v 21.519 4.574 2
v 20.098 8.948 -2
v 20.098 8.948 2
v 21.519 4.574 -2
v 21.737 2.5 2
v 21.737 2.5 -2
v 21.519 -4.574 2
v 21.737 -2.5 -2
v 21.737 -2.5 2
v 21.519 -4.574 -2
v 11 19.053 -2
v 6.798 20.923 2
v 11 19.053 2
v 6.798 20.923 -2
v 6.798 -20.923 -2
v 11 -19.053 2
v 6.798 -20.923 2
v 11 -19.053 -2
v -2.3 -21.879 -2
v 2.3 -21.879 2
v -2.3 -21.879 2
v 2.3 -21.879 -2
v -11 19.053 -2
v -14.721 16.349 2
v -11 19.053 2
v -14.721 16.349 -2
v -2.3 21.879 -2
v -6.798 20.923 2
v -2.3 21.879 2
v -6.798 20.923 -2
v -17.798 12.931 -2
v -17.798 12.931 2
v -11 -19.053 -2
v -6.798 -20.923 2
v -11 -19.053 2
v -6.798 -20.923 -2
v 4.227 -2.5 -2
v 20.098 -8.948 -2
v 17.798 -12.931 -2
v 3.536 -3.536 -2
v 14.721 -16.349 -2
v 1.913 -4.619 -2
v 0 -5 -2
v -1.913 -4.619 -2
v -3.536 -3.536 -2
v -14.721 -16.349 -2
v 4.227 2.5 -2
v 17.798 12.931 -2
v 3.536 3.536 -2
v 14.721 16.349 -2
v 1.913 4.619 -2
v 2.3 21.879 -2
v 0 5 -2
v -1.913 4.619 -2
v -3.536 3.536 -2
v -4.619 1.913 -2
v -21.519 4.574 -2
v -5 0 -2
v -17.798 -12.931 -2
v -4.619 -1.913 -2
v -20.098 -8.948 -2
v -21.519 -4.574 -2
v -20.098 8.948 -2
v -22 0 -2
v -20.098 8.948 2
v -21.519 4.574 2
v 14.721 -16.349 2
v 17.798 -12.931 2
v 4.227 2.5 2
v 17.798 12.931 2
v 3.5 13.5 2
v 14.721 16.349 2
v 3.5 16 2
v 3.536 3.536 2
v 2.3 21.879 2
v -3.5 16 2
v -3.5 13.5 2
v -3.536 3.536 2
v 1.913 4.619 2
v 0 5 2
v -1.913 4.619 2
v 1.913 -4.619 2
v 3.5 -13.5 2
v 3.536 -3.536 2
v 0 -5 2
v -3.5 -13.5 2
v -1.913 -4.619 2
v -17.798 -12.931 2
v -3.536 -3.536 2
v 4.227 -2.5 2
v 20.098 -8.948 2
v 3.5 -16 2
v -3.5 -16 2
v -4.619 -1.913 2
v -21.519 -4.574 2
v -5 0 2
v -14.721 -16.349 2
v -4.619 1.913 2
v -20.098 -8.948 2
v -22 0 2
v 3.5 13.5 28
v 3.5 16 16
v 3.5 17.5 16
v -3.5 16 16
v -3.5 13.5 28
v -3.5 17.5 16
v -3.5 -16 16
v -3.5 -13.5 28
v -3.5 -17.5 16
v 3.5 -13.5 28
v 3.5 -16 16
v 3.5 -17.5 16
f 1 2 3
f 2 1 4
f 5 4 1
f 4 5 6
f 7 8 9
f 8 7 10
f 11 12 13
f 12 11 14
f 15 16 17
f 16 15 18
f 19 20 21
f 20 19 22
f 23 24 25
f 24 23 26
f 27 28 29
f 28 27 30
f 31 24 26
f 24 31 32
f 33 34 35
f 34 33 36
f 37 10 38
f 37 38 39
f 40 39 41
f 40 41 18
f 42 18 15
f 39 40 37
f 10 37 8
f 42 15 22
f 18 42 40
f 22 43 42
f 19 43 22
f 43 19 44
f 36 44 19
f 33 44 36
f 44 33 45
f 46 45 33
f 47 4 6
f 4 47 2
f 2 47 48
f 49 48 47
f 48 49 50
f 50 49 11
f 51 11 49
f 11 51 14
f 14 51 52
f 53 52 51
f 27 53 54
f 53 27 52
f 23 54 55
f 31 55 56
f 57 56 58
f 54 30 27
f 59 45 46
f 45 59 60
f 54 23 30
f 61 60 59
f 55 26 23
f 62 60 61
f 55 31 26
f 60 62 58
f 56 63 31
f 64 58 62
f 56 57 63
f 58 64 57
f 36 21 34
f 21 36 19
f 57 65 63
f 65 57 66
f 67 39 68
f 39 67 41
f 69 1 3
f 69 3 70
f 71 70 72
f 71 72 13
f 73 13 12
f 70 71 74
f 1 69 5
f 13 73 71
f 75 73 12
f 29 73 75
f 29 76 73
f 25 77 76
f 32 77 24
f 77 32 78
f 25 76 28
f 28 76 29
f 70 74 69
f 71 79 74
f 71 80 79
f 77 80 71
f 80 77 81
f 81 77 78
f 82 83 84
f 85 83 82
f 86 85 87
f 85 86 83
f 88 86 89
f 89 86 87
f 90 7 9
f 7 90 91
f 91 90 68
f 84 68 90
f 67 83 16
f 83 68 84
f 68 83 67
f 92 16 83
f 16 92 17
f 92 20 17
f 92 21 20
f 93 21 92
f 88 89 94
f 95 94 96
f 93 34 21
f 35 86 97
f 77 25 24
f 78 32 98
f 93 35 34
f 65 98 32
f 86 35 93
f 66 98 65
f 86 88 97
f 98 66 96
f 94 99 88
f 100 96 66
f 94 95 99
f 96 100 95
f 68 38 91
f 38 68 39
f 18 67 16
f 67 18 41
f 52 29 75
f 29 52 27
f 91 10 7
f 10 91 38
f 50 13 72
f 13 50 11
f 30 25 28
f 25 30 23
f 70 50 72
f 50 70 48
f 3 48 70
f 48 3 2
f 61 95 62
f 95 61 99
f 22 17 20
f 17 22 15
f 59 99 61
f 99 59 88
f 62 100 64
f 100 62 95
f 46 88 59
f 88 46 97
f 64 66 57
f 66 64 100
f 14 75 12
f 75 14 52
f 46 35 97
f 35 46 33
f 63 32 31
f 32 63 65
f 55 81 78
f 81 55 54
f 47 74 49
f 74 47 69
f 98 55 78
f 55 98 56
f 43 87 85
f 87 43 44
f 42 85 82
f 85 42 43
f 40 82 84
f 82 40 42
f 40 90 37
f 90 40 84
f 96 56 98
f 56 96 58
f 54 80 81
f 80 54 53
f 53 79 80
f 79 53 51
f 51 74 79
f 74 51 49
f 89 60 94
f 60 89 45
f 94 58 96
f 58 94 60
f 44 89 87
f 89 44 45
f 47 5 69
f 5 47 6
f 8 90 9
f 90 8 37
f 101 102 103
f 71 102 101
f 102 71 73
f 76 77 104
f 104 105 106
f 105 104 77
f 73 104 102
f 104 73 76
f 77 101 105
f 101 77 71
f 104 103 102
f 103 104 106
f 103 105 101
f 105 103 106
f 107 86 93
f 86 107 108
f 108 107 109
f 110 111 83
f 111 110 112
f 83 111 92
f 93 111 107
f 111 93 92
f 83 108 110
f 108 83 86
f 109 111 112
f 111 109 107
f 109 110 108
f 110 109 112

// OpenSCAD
BASE_RAD = 16;
BASE_HEIGHT = 4;
CABLE_WIDTH = 5;
HOLE_RAD = 5;
CLIP_WIDTH = 7;
CLIP_HEIGHT = 20;
CLIP_DEPTH = 2.5;
SNAP_CLEARANCE = 6;
SNAP_OFFSET = CLIP_HEIGHT - SNAP_CLEARANCE;
SNAP_SIZE = 2;
SNAP_HEIGHT = 12;

//Draw a prism based on a
//right angled triangle
//l - length of prism
//w - width of triangle
//h - height of triangle
module prism(l, w, h) {
	translate([0, l, 0]) rotate( a= [90, 0, 0])
	linear_extrude(height = l) polygon(points = [
		[0, 0],
		[w, 0],
		[0, h]
	], paths=[[0,1,2,0]]);
}

module base() {
	lip = 6;
	difference() {
		cylinder(h=BASE_HEIGHT,r=BASE_RAD+lip, center=true);
		cylinder(h=BASE_HEIGHT+1, r=HOLE_RAD, center=true);
		translate([0, -CABLE_WIDTH/2, -(BASE_HEIGHT+1)/2])
		cube([BASE_RAD + lip + 1, CABLE_WIDTH, BASE_HEIGHT+1, ]);
	}
}

module clip() {

		rotate([0,0,180]) {
		cube([CLIP_WIDTH, CLIP_DEPTH, CLIP_HEIGHT]);
		translate([CLIP_WIDTH,0, 18])
		rotate([0,0,90])
		prism(CLIP_WIDTH, 4, SNAP_HEIGHT);
}
}

module main() {
	base();

	rotate([0,0,180]) 
	translate([CLIP_WIDTH/2, -(BASE_RAD - CLIP_DEPTH), -BASE_HEIGHT/2]) 
		clip(-1);
	
	

	rotate([0,0,0]) {
		translate([(CLIP_WIDTH/2), -(BASE_RAD - CLIP_DEPTH), -BASE_HEIGHT/2]) {
			clip();
		}
	}
}


main();
